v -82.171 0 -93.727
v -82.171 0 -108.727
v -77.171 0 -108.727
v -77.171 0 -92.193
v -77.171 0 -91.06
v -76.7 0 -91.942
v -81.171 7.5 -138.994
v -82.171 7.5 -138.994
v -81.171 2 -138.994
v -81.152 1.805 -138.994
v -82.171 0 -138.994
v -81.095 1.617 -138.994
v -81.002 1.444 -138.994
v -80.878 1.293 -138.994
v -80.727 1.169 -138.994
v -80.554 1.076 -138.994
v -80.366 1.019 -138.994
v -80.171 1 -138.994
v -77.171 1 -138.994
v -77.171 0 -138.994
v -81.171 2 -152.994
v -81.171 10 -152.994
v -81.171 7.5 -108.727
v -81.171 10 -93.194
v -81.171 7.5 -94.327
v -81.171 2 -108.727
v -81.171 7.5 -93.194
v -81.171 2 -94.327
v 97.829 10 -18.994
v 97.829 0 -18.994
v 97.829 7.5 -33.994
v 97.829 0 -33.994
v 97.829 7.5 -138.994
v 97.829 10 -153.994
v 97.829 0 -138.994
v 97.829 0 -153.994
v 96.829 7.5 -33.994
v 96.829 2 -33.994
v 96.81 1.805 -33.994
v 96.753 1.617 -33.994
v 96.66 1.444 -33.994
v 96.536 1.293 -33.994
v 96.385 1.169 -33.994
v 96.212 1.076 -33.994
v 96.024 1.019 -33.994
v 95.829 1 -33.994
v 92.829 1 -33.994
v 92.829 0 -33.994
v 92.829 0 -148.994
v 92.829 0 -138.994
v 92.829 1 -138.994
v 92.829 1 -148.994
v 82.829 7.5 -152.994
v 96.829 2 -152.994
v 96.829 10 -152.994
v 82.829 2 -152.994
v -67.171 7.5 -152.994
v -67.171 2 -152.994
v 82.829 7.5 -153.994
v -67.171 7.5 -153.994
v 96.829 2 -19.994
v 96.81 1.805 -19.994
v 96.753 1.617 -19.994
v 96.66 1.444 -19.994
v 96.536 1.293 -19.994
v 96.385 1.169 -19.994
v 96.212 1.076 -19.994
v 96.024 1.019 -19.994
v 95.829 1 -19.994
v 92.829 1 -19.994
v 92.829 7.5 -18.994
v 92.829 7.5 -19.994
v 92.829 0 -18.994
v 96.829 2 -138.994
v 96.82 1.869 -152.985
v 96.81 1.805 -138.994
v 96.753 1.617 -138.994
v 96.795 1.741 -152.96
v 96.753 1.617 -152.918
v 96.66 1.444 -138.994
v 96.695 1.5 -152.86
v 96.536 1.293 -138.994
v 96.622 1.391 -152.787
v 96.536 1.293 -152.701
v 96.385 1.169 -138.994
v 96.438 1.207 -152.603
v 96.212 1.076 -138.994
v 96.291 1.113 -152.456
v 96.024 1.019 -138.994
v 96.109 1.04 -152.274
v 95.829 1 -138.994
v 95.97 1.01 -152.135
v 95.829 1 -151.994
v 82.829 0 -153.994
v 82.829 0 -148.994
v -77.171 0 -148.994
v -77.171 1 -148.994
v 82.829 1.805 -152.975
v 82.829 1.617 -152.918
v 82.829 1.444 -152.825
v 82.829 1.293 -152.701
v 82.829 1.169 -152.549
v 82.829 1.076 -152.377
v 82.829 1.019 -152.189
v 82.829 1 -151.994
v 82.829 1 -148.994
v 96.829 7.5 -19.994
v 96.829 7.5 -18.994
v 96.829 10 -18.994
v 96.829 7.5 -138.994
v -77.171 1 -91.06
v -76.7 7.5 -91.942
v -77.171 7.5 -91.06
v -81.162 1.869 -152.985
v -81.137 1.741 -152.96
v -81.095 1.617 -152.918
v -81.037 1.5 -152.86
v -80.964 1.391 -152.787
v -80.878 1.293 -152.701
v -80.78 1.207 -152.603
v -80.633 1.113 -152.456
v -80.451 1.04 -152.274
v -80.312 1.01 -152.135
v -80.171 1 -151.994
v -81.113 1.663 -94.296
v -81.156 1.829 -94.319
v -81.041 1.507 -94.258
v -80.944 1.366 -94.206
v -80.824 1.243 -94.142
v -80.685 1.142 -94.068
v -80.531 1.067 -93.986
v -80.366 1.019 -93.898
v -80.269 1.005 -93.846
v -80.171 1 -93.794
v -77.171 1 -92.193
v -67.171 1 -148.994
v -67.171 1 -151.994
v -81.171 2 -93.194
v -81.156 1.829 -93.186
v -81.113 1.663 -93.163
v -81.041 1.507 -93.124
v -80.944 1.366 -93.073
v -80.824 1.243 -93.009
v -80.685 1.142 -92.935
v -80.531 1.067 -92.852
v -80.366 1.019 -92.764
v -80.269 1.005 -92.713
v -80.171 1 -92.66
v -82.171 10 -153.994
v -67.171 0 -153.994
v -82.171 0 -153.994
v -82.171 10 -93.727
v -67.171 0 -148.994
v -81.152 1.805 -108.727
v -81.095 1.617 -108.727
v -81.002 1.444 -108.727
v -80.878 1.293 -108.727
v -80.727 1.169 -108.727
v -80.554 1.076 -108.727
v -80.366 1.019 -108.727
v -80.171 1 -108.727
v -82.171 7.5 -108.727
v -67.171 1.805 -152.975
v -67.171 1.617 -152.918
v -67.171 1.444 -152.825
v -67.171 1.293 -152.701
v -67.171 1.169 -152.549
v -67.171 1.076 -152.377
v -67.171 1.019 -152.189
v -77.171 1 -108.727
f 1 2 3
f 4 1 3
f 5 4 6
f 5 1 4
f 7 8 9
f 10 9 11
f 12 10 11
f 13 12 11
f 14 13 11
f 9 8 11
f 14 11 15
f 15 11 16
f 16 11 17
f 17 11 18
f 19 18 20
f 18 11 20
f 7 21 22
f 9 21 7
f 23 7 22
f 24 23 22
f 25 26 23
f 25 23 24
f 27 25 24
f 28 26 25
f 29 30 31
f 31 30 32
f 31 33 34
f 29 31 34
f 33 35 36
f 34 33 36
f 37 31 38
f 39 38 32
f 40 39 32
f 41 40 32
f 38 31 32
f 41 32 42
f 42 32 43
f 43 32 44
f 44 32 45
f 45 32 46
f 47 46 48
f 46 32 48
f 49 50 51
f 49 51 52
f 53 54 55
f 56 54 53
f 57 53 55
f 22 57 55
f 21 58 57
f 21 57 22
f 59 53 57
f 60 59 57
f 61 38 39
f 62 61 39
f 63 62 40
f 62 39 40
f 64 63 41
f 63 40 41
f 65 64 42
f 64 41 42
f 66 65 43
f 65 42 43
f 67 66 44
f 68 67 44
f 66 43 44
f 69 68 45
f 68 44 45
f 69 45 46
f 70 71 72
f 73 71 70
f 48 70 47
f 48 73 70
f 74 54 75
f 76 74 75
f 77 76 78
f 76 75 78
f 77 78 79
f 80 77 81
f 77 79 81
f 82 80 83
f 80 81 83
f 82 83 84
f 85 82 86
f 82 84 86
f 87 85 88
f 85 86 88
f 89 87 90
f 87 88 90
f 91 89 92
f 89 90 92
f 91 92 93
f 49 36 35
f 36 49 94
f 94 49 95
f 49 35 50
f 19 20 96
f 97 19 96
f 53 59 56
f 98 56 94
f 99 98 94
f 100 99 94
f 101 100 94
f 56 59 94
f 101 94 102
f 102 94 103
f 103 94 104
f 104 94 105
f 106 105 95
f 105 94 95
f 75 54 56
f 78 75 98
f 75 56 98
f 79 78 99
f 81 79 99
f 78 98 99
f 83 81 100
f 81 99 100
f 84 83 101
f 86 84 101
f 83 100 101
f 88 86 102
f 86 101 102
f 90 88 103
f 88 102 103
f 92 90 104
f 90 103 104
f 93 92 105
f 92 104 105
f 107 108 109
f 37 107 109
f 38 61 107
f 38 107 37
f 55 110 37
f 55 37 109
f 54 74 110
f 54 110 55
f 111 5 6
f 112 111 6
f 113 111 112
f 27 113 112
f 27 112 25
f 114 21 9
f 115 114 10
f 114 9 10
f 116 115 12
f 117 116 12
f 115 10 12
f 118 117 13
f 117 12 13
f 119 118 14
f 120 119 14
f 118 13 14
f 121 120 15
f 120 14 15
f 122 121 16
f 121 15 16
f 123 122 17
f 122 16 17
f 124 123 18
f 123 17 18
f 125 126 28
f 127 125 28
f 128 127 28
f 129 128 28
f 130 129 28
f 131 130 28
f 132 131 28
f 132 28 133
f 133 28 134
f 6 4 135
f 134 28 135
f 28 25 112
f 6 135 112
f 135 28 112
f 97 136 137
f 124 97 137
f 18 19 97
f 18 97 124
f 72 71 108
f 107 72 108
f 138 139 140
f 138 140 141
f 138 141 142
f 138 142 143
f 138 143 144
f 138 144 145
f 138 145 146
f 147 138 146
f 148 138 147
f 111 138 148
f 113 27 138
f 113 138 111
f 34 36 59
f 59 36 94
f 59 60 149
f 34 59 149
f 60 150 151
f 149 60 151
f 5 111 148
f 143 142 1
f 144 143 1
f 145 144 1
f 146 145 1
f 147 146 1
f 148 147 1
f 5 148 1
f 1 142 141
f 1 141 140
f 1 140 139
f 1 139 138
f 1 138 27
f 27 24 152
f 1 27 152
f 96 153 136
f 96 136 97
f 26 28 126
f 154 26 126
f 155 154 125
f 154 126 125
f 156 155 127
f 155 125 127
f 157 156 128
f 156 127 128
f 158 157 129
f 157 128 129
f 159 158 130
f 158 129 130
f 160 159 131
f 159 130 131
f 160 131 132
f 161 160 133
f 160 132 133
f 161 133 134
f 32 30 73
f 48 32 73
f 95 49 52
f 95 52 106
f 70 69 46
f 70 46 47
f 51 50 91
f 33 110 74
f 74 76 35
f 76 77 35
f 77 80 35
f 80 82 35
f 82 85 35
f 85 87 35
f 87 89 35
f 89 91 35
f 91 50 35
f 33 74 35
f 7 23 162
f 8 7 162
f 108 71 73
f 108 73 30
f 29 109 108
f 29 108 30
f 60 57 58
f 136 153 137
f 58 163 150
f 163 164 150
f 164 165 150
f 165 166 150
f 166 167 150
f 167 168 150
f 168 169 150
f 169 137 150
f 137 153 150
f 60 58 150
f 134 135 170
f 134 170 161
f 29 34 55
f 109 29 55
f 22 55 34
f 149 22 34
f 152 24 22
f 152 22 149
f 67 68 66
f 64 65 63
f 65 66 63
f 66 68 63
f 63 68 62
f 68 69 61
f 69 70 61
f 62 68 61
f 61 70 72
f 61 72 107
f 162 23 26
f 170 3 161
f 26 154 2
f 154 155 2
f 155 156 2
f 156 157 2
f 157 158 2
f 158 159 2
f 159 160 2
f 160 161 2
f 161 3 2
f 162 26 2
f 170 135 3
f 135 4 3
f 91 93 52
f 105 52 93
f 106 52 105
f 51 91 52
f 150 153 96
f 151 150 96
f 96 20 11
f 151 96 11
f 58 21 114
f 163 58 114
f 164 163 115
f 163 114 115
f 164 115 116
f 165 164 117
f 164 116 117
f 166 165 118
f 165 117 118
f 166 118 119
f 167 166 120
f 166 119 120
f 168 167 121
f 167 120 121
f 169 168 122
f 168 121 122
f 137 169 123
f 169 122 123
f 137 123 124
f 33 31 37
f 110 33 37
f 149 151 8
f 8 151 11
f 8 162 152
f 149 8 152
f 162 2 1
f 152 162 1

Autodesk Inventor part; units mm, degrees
ref_plane "YZ Plane" through (0, 0, 0) normal (1, 0, 0) x (0, 1, 0)
ref_plane "XZ Plane" through (0, 0, 0) normal (0, 1, 0) x (-1, 0, 0)
ref_plane "XY Plane" through (0, 0, 0) normal (0, 0, 1) x (1, 0, 0)
sketch "Sketch1" plane through (0, 0, 0) normal (0, 1, 0) x (-1, 0, 0)
  line L0 (82.171, 116.0061) -> (-97.829, 116.0061)
  line L1 (-97.829, 116.0061) -> (-97.829, -153.9939)
  line L2 (-97.829, -153.9939) -> (82.171, -153.9939)
  line L3 (81.171, 115.0061) -> (-96.829, 115.0061)
  line L4 (-96.829, 115.0061) -> (-96.829, -152.9939)
  line L5 (-96.829, -152.9939) -> (81.171, -152.9939)
  line L6 (81.171, 56.2728) -> (81.171, 115.0061)
  line L7 (82.171, -153.9939) -> (82.171, -93.7272)
  line L8 (82.171, 55.7393) -> (82.171, 116.0061)
  line L9 (81.171, -152.9939) -> (81.171, -94.2607)
  line L10 (-92.829, 111.0061) -> (77.171, 111.0061)
  line L11 (-92.829, 111.0061) -> (-92.829, -148.9939)
  line L12 (-92.829, -148.9939) -> (77.171, -148.9939)
  line L13 (77.171, 111.0061) -> (77.171, 58.4069)
  line L14 (77.171, -96.3948) -> (77.171, -148.9939)
  line L15 (67.171, 133.2815) -> (-82.829, 133.2815)
  line L16 (-82.829, 133.2815) -> (-82.829, 85.6394)
  line L17 (-82.829, 85.6394) -> (67.171, 85.6394)
  line L18 (67.171, 85.6394) -> (67.171, 133.2815)
  line L19 (91.8793, 101.0061) -> (59.7353, 101.0061)
  line L20 (59.7353, 101.0061) -> (59.7353, 70.7393)
  line L21 (59.7353, 70.7393) -> (91.8793, 70.7393)
  line L22 (91.8793, 70.7393) -> (91.8793, 101.0061)
  line L23 (-88.3298, 101.0061) -> (-103.1355, 101.0061)
  line L24 (-103.1355, 101.0061) -> (-103.1355, -3.9939)
  line L25 (-103.1355, -3.9939) -> (-88.3298, -3.9939)
  line L26 (-88.3298, -3.9939) -> (-88.3298, 101.0061)
  line L27 (67.171, -171.2694) -> (-82.829, -171.2694)
  line L28 (-82.829, -171.2694) -> (-82.829, -123.6273)
  line L29 (-82.829, -123.6273) -> (67.171, -123.6273)
  line L30 (67.171, -123.6273) -> (67.171, -171.2694)
  line L31 (91.8793, -138.9939) -> (59.7353, -138.9939)
  line L32 (59.7353, -138.9939) -> (59.7353, -108.7272)
  line L33 (59.7353, -108.7272) -> (91.8793, -108.7272)
  line L34 (91.8793, -108.7272) -> (91.8793, -138.9939)
  line L35 (-88.3298, -138.9939) -> (-103.1355, -138.9939)
  line L36 (-103.1355, -138.9939) -> (-103.1355, -33.9939)
  line L37 (-103.1355, -33.9939) -> (-88.3298, -33.9939)
  line L38 (-88.3298, -33.9939) -> (-88.3298, -138.9939)
  line L39 (82.171, 55.7393) -> (171.671, -4.2607)
  line L40 (82.171, -93.7272) -> (171.671, -33.7272)
  line L41 (171.671, -4.2607) -> (171.671, -33.7272)
  line L42 (90.3045, 40.9341) -> (157.1017, -3.8462)
  line L43 (107.5303, 66.6293) -> (174.3275, 21.8491)
  line L44 (107.5303, 66.6293) -> (90.3045, 40.9341)
  line L45 (174.3275, 21.8491) -> (157.1017, -3.8462)
  line L46 (174.3275, -59.837) -> (157.1017, -34.1417)
  line L47 (107.5303, -104.6172) -> (174.3275, -59.837)
  line L48 (90.3045, -78.922) -> (157.1017, -34.1417)
  line L49 (107.5303, -104.6172) -> (90.3045, -78.922)
  line L50 (170.671, -4.7942) -> (170.671, -33.1937)
  line L51 (166.671, -6.9284) -> (166.671, -31.0595)
  line L52 (166.671, -6.9284) -> (77.171, 53.0716)
  line L53 (81.171, 56.2728) -> (81.171, 55.2058)
  line L54 (77.171, 58.4069) -> (77.171, 53.0716)
  line L55 (170.671, -4.7942) -> (81.171, 55.2058)
  line L56 (35.7741, 85.6394) -> (35.6306, 85.7356)
  line L57 (166.671, -31.0595) -> (77.171, -91.0595)
  line L58 (81.171, -94.2607) -> (81.171, -93.1937)
  line L59 (77.171, -96.3948) -> (77.171, -91.0595)
  line L60 (170.671, -33.1937) -> (81.171, -93.1937)
  dimension "d0" = 270
  dimension "d3" = 1
  dimension "d4" = 1
  dimension "d5" = 1
  dimension "d17" = 5
  dimension "d30" = 5
  dimension "d31" = 1
  dimension "d32" = 15
  dimension "d33" = 15
  dimension "d34" = 15
  dimension "d35" = 15
  dimension "d38" = 15
extrude "Extrusion1" add sketch "Sketch1" along normal blind 10 contours L8 L19 L6 L3 L18 L0 | L18 L3 L16 L0 | L8 L21 L6 L19 | L16 L3 L4 L23 L1 L0 | L8 L39 L44 L55 L53 L6 L21 | L23 L4 L25 L1 | L39 L45 L55 L44 | L25 L4 L37 L1 | L39 L41 L40 L46 L60 L50 L55 L45 | L37 L4 L35 L1 | L35 L4 L5 L28 L2 L1 | L40 L49 L60 L46 | L28 L5 L30 L2 | L40 L7 L33 L9 L58 L60 L49 | L30 L5 L9 L31 L7 L2 | L7 L31 L9 L33
extrude "Extrusion2" add sketch "Sketch1" along normal blind 1 contours L18 L10 L16 L3 | L3 L6 L19 L13 L10 L18 | L6 L21 L13 L19 | L16 L10 L11 L23 L4 L3 | L6 L53 L55 L44 L52 L54 L13 L21 | L23 L11 L25 L4 | L55 L45 L52 L44 | L25 L11 L37 L4 | L55 L50 L60 L46 L57 L51 L52 L45 | L37 L11 L35 L4 | L35 L11 L12 L28 L5 L4 | L60 L49 L57 L46 | L28 L12 L30 L5 | L60 L58 L9 L33 L14 L59 L57 L49 | L30 L12 L14 L31 L9 L5 | L9 L31 L14 L33
fillet "Fillet1" radius 1 8 edges at (-81.171, 1, -123.0938) (7.829, 1, -152.9939) (-81.171, 1, 85.1059) (7.829, 1, 115.0061) (96.829, 1, -18.9939) (-125.921, 1, -63.1937) (-170.671, 1, -18.9939) (-125.921, 1, 25.2058)
extrude "Extrusion5" cut sketch "Sketch1" along normal blind 7.5 contours L18 L3 L16 L0 | L0 L16 L15 L18 | L19 L22 L21 L8 | L8 L21 L6 L19 | L18 L10 L16 L3 | L6 L21 L13 L19 | L18 L19 L20 L17 L16 L10 | L13 L21 L20 L17 L18 L19 | L23 L4 L25 L1 | L1 L25 L24 L23 | L18 L17 L20 L19 | L44 L43 L45 L39 | L39 L45 L55 L44 | L23 L11 L25 L4 | L55 L45 L52 L44 | L37 L4 L35 L1 | L1 L35 L36 L37 | L23 L26 L25 L11 | L52 L45 L42 L44 | L37 L11 L35 L4 | L37 L38 L35 L11 | L46 L47 L49 L40 | L40 L49 L60 L46 | L28 L5 L30 L2 | L2 L30 L27 L28 | L60 L49 L57 L46 | L28 L12 L30 L5 | L57 L49 L48 L46 | L28 L29 L32 L31 L30 L12 | L33 L34 L31 L7 | L7 L31 L9 L33 | L9 L31 L14 L33 | L31 L32 L29 L30 | L30 L29 L32 L33 L14 L31
sketch "Sketch3" plane through (0, 10, 0) normal (0, 1, 0) x (1, 0, 0)
  line L0 (-77.171, -53.0716) -> (-77.171, 91.0595)
  line L1 (-77.171, 91.0595) -> (-82.171, 93.7272)
  line L2 (-82.171, 93.7272) -> (-237.6798, 93.7272)
  line L3 (-237.6798, 93.7272) -> (-237.6798, -55.7393)
  line L4 (-80.171, -70.7393) -> (-80.171, -54.6722) projected
  line L5 (-77.171, -53.0716) -> (-82.171, -55.7393)
  line L6 (-82.171, -55.7393) -> (-237.6798, -55.7393)
  line L7 (-77.171, 18.9939) -> (139.9462, 18.9939)
  line L8 (139.9462, 18.9939) -> (139.9462, 278.7318)
  line L9 (139.9462, 278.7318) -> (-77.171, 278.7318)
  line L10 (-126.7833, 93.7272) -> (-77.171, 278.7318)
  point P0 (0, 0)
  point P1 (-81.171, -55.2058)
extrude "Extrusion9" cut sketch "Sketch3" against normal blind 100 contours L0 L1 L2 L10 L9 L8 L7 keep common part
sketch "Sketch6" plane through (96.829, 10, -18.9939) normal (0, 0, 1) x (1, 0, 0)
  line L0 (1, -10) -> (-4, -10)
  line L1 (-4, -10) -> (-4, -2.5)
  line L2 (-4, -2.5) -> (1, -2.5)
  line L3 (1, -2.5) -> (1, -10)
  point P0 (-96.829, -10)
  dimension "d68" = 7.5
  dimension "d69" = 5
extrude "Extrusion10" add sketch "Sketch6" against normal blind 1
sketch "Sketch7" plane through (-82.171, 0, -93.7272) normal (-0.4707228, 0, 0.8822811) x (0.8822811, 0, 0.4707228)
  line L0 (117.2074, 7.5) -> (-15.1347, 7.5) projected
  line L1 (0, 0) -> (5.6671, 0)
  line L2 (5.6671, 0) -> (5.6671, 7.5)
  line L3 (5.6671, 7.5) -> (0, 7.5)
  line L4 (0, 7.5) -> (0, 0)
  point P0 (116.6174, 0)
extrude "Extrusion11" add sketch "Sketch7" against normal blind 1
properties part number "male"
